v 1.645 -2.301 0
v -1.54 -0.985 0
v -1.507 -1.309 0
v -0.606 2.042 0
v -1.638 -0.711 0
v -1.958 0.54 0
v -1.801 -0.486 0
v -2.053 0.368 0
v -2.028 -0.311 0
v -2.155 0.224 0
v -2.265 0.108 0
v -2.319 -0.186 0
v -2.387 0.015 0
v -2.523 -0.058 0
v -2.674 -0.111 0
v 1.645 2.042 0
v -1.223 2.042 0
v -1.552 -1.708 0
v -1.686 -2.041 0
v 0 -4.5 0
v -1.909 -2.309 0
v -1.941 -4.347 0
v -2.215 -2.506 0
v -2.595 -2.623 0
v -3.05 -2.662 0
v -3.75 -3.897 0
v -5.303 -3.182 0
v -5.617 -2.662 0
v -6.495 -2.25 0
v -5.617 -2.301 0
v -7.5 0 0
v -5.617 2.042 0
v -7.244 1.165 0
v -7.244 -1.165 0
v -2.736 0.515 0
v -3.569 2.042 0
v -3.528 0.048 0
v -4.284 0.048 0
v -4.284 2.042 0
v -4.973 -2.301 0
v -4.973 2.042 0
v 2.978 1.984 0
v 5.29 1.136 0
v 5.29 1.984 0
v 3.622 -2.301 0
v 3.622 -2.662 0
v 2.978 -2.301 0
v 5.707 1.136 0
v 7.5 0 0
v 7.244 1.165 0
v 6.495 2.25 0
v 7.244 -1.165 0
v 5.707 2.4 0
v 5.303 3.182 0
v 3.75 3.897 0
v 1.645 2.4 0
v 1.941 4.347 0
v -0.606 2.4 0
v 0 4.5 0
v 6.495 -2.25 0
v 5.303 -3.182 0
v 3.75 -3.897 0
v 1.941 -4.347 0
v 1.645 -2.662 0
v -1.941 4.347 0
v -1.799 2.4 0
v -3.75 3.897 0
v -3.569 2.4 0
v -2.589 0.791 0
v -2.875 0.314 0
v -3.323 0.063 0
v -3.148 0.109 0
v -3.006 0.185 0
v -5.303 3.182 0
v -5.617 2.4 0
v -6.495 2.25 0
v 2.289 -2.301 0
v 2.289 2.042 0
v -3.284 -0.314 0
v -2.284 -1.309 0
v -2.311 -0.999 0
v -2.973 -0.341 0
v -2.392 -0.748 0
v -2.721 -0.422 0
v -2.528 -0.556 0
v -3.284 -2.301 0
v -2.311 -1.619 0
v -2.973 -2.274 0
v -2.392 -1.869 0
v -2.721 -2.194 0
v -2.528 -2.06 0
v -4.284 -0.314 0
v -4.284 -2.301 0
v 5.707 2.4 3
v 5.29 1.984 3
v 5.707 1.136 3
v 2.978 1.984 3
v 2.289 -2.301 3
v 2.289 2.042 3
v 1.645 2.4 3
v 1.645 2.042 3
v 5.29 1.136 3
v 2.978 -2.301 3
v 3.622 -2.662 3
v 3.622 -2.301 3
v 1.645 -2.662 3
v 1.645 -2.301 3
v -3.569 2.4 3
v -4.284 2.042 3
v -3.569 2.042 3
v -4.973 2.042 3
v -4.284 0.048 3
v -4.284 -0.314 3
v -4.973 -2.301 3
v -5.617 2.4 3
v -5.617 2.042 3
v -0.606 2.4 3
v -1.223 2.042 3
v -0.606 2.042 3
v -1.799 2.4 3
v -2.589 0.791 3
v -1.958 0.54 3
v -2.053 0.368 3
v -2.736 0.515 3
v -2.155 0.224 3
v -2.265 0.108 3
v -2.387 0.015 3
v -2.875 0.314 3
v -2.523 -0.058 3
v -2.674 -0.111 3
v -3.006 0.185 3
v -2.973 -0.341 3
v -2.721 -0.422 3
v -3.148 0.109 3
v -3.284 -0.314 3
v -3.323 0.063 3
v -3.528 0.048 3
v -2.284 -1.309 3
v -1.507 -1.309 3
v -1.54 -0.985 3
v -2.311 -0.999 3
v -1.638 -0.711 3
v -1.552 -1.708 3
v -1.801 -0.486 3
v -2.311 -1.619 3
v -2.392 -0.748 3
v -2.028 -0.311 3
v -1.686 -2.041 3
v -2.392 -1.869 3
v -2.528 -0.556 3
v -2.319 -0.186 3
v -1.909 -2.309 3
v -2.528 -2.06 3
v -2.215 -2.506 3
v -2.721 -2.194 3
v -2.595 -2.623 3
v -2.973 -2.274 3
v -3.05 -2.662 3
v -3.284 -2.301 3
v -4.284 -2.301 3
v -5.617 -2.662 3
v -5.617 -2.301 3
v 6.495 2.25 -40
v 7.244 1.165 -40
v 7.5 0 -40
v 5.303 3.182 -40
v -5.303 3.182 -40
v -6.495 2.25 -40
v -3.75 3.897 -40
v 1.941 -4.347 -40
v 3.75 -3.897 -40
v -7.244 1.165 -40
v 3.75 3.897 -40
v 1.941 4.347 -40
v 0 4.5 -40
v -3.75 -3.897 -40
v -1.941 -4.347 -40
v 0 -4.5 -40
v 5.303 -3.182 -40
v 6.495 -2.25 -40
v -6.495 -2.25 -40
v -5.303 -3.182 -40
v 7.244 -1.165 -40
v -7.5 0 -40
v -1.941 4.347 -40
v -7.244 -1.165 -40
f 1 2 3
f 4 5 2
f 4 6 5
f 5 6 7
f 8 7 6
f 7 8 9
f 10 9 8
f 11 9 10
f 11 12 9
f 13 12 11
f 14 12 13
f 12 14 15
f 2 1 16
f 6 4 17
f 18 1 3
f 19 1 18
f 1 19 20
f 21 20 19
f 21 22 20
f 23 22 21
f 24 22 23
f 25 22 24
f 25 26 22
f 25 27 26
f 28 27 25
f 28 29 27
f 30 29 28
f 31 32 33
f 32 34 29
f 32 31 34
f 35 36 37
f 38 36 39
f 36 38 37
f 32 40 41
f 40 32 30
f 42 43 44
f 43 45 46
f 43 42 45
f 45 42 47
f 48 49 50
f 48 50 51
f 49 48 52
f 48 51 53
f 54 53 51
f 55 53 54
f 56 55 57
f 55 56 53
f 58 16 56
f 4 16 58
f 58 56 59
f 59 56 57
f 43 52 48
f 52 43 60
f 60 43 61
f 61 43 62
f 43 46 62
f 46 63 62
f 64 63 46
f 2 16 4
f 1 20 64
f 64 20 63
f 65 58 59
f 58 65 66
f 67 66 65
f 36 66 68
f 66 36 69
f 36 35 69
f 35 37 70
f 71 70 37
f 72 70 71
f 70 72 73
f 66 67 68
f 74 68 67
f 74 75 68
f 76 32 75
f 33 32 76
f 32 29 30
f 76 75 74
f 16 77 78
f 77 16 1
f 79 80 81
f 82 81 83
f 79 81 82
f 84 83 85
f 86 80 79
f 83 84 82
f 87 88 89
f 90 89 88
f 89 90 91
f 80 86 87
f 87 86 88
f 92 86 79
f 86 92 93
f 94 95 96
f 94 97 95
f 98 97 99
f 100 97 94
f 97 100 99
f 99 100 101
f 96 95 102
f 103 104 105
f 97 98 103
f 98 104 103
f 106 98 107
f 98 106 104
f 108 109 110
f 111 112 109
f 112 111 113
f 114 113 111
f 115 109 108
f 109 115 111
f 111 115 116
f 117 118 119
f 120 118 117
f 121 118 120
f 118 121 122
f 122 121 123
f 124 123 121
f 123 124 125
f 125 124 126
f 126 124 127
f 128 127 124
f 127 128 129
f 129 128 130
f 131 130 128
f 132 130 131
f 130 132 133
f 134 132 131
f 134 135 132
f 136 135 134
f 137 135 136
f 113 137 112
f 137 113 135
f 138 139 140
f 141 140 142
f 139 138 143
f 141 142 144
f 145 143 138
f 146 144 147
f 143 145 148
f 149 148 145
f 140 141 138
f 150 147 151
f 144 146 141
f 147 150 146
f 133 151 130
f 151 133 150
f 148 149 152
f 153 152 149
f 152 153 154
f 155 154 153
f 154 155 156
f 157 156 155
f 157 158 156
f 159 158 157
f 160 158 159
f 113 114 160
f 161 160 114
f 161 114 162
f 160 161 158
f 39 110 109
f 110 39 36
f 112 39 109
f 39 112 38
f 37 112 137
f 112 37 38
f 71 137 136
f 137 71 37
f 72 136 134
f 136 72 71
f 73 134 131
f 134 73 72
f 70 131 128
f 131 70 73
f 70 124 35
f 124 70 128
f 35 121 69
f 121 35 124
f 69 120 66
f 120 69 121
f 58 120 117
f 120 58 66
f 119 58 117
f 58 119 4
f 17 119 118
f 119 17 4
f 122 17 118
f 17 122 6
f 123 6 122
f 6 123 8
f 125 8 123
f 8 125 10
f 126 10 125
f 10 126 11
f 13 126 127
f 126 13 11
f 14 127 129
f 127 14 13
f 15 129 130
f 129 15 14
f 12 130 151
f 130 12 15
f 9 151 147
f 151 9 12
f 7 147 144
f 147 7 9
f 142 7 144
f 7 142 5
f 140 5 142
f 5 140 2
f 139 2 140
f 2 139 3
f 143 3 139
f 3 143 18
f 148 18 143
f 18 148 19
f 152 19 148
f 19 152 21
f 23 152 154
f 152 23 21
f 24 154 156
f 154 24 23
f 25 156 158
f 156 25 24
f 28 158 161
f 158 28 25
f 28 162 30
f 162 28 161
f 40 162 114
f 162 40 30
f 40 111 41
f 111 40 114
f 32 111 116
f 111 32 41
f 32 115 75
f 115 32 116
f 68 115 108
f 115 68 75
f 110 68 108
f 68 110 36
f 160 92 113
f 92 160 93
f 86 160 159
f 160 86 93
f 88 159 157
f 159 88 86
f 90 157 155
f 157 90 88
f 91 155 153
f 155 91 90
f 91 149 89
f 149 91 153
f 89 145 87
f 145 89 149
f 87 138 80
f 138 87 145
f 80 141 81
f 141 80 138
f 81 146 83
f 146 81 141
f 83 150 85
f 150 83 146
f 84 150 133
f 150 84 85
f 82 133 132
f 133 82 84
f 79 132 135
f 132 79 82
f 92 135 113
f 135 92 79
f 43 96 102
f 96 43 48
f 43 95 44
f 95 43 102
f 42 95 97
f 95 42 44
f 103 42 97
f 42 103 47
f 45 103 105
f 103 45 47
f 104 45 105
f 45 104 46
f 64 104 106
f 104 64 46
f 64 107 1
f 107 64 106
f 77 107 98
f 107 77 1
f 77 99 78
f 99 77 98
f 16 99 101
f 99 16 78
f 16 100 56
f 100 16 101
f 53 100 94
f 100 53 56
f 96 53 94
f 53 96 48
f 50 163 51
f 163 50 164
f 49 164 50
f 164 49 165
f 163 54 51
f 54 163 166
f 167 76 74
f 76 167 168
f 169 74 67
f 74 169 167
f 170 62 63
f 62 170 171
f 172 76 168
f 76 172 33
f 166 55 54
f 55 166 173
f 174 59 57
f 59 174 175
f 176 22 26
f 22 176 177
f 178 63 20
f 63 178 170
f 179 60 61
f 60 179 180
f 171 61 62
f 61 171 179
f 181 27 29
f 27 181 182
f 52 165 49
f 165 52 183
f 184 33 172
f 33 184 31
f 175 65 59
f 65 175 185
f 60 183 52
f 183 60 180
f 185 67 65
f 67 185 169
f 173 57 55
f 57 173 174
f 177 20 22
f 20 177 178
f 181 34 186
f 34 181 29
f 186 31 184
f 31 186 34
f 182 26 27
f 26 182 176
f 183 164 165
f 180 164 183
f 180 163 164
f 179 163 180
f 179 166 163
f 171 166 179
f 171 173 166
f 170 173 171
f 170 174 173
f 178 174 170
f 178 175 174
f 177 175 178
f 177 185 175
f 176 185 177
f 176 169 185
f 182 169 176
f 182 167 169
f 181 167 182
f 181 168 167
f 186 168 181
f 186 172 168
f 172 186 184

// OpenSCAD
mirror([0, 1, 0]) translate([-6, -2.4, 0]) linear_extrude(height=3) text("R L",5, font = "DejaVu Serif");
translate([0, 0, -20]) scale([1, 0.6, 1]) cylinder(40, r=7.5, center=true); 
